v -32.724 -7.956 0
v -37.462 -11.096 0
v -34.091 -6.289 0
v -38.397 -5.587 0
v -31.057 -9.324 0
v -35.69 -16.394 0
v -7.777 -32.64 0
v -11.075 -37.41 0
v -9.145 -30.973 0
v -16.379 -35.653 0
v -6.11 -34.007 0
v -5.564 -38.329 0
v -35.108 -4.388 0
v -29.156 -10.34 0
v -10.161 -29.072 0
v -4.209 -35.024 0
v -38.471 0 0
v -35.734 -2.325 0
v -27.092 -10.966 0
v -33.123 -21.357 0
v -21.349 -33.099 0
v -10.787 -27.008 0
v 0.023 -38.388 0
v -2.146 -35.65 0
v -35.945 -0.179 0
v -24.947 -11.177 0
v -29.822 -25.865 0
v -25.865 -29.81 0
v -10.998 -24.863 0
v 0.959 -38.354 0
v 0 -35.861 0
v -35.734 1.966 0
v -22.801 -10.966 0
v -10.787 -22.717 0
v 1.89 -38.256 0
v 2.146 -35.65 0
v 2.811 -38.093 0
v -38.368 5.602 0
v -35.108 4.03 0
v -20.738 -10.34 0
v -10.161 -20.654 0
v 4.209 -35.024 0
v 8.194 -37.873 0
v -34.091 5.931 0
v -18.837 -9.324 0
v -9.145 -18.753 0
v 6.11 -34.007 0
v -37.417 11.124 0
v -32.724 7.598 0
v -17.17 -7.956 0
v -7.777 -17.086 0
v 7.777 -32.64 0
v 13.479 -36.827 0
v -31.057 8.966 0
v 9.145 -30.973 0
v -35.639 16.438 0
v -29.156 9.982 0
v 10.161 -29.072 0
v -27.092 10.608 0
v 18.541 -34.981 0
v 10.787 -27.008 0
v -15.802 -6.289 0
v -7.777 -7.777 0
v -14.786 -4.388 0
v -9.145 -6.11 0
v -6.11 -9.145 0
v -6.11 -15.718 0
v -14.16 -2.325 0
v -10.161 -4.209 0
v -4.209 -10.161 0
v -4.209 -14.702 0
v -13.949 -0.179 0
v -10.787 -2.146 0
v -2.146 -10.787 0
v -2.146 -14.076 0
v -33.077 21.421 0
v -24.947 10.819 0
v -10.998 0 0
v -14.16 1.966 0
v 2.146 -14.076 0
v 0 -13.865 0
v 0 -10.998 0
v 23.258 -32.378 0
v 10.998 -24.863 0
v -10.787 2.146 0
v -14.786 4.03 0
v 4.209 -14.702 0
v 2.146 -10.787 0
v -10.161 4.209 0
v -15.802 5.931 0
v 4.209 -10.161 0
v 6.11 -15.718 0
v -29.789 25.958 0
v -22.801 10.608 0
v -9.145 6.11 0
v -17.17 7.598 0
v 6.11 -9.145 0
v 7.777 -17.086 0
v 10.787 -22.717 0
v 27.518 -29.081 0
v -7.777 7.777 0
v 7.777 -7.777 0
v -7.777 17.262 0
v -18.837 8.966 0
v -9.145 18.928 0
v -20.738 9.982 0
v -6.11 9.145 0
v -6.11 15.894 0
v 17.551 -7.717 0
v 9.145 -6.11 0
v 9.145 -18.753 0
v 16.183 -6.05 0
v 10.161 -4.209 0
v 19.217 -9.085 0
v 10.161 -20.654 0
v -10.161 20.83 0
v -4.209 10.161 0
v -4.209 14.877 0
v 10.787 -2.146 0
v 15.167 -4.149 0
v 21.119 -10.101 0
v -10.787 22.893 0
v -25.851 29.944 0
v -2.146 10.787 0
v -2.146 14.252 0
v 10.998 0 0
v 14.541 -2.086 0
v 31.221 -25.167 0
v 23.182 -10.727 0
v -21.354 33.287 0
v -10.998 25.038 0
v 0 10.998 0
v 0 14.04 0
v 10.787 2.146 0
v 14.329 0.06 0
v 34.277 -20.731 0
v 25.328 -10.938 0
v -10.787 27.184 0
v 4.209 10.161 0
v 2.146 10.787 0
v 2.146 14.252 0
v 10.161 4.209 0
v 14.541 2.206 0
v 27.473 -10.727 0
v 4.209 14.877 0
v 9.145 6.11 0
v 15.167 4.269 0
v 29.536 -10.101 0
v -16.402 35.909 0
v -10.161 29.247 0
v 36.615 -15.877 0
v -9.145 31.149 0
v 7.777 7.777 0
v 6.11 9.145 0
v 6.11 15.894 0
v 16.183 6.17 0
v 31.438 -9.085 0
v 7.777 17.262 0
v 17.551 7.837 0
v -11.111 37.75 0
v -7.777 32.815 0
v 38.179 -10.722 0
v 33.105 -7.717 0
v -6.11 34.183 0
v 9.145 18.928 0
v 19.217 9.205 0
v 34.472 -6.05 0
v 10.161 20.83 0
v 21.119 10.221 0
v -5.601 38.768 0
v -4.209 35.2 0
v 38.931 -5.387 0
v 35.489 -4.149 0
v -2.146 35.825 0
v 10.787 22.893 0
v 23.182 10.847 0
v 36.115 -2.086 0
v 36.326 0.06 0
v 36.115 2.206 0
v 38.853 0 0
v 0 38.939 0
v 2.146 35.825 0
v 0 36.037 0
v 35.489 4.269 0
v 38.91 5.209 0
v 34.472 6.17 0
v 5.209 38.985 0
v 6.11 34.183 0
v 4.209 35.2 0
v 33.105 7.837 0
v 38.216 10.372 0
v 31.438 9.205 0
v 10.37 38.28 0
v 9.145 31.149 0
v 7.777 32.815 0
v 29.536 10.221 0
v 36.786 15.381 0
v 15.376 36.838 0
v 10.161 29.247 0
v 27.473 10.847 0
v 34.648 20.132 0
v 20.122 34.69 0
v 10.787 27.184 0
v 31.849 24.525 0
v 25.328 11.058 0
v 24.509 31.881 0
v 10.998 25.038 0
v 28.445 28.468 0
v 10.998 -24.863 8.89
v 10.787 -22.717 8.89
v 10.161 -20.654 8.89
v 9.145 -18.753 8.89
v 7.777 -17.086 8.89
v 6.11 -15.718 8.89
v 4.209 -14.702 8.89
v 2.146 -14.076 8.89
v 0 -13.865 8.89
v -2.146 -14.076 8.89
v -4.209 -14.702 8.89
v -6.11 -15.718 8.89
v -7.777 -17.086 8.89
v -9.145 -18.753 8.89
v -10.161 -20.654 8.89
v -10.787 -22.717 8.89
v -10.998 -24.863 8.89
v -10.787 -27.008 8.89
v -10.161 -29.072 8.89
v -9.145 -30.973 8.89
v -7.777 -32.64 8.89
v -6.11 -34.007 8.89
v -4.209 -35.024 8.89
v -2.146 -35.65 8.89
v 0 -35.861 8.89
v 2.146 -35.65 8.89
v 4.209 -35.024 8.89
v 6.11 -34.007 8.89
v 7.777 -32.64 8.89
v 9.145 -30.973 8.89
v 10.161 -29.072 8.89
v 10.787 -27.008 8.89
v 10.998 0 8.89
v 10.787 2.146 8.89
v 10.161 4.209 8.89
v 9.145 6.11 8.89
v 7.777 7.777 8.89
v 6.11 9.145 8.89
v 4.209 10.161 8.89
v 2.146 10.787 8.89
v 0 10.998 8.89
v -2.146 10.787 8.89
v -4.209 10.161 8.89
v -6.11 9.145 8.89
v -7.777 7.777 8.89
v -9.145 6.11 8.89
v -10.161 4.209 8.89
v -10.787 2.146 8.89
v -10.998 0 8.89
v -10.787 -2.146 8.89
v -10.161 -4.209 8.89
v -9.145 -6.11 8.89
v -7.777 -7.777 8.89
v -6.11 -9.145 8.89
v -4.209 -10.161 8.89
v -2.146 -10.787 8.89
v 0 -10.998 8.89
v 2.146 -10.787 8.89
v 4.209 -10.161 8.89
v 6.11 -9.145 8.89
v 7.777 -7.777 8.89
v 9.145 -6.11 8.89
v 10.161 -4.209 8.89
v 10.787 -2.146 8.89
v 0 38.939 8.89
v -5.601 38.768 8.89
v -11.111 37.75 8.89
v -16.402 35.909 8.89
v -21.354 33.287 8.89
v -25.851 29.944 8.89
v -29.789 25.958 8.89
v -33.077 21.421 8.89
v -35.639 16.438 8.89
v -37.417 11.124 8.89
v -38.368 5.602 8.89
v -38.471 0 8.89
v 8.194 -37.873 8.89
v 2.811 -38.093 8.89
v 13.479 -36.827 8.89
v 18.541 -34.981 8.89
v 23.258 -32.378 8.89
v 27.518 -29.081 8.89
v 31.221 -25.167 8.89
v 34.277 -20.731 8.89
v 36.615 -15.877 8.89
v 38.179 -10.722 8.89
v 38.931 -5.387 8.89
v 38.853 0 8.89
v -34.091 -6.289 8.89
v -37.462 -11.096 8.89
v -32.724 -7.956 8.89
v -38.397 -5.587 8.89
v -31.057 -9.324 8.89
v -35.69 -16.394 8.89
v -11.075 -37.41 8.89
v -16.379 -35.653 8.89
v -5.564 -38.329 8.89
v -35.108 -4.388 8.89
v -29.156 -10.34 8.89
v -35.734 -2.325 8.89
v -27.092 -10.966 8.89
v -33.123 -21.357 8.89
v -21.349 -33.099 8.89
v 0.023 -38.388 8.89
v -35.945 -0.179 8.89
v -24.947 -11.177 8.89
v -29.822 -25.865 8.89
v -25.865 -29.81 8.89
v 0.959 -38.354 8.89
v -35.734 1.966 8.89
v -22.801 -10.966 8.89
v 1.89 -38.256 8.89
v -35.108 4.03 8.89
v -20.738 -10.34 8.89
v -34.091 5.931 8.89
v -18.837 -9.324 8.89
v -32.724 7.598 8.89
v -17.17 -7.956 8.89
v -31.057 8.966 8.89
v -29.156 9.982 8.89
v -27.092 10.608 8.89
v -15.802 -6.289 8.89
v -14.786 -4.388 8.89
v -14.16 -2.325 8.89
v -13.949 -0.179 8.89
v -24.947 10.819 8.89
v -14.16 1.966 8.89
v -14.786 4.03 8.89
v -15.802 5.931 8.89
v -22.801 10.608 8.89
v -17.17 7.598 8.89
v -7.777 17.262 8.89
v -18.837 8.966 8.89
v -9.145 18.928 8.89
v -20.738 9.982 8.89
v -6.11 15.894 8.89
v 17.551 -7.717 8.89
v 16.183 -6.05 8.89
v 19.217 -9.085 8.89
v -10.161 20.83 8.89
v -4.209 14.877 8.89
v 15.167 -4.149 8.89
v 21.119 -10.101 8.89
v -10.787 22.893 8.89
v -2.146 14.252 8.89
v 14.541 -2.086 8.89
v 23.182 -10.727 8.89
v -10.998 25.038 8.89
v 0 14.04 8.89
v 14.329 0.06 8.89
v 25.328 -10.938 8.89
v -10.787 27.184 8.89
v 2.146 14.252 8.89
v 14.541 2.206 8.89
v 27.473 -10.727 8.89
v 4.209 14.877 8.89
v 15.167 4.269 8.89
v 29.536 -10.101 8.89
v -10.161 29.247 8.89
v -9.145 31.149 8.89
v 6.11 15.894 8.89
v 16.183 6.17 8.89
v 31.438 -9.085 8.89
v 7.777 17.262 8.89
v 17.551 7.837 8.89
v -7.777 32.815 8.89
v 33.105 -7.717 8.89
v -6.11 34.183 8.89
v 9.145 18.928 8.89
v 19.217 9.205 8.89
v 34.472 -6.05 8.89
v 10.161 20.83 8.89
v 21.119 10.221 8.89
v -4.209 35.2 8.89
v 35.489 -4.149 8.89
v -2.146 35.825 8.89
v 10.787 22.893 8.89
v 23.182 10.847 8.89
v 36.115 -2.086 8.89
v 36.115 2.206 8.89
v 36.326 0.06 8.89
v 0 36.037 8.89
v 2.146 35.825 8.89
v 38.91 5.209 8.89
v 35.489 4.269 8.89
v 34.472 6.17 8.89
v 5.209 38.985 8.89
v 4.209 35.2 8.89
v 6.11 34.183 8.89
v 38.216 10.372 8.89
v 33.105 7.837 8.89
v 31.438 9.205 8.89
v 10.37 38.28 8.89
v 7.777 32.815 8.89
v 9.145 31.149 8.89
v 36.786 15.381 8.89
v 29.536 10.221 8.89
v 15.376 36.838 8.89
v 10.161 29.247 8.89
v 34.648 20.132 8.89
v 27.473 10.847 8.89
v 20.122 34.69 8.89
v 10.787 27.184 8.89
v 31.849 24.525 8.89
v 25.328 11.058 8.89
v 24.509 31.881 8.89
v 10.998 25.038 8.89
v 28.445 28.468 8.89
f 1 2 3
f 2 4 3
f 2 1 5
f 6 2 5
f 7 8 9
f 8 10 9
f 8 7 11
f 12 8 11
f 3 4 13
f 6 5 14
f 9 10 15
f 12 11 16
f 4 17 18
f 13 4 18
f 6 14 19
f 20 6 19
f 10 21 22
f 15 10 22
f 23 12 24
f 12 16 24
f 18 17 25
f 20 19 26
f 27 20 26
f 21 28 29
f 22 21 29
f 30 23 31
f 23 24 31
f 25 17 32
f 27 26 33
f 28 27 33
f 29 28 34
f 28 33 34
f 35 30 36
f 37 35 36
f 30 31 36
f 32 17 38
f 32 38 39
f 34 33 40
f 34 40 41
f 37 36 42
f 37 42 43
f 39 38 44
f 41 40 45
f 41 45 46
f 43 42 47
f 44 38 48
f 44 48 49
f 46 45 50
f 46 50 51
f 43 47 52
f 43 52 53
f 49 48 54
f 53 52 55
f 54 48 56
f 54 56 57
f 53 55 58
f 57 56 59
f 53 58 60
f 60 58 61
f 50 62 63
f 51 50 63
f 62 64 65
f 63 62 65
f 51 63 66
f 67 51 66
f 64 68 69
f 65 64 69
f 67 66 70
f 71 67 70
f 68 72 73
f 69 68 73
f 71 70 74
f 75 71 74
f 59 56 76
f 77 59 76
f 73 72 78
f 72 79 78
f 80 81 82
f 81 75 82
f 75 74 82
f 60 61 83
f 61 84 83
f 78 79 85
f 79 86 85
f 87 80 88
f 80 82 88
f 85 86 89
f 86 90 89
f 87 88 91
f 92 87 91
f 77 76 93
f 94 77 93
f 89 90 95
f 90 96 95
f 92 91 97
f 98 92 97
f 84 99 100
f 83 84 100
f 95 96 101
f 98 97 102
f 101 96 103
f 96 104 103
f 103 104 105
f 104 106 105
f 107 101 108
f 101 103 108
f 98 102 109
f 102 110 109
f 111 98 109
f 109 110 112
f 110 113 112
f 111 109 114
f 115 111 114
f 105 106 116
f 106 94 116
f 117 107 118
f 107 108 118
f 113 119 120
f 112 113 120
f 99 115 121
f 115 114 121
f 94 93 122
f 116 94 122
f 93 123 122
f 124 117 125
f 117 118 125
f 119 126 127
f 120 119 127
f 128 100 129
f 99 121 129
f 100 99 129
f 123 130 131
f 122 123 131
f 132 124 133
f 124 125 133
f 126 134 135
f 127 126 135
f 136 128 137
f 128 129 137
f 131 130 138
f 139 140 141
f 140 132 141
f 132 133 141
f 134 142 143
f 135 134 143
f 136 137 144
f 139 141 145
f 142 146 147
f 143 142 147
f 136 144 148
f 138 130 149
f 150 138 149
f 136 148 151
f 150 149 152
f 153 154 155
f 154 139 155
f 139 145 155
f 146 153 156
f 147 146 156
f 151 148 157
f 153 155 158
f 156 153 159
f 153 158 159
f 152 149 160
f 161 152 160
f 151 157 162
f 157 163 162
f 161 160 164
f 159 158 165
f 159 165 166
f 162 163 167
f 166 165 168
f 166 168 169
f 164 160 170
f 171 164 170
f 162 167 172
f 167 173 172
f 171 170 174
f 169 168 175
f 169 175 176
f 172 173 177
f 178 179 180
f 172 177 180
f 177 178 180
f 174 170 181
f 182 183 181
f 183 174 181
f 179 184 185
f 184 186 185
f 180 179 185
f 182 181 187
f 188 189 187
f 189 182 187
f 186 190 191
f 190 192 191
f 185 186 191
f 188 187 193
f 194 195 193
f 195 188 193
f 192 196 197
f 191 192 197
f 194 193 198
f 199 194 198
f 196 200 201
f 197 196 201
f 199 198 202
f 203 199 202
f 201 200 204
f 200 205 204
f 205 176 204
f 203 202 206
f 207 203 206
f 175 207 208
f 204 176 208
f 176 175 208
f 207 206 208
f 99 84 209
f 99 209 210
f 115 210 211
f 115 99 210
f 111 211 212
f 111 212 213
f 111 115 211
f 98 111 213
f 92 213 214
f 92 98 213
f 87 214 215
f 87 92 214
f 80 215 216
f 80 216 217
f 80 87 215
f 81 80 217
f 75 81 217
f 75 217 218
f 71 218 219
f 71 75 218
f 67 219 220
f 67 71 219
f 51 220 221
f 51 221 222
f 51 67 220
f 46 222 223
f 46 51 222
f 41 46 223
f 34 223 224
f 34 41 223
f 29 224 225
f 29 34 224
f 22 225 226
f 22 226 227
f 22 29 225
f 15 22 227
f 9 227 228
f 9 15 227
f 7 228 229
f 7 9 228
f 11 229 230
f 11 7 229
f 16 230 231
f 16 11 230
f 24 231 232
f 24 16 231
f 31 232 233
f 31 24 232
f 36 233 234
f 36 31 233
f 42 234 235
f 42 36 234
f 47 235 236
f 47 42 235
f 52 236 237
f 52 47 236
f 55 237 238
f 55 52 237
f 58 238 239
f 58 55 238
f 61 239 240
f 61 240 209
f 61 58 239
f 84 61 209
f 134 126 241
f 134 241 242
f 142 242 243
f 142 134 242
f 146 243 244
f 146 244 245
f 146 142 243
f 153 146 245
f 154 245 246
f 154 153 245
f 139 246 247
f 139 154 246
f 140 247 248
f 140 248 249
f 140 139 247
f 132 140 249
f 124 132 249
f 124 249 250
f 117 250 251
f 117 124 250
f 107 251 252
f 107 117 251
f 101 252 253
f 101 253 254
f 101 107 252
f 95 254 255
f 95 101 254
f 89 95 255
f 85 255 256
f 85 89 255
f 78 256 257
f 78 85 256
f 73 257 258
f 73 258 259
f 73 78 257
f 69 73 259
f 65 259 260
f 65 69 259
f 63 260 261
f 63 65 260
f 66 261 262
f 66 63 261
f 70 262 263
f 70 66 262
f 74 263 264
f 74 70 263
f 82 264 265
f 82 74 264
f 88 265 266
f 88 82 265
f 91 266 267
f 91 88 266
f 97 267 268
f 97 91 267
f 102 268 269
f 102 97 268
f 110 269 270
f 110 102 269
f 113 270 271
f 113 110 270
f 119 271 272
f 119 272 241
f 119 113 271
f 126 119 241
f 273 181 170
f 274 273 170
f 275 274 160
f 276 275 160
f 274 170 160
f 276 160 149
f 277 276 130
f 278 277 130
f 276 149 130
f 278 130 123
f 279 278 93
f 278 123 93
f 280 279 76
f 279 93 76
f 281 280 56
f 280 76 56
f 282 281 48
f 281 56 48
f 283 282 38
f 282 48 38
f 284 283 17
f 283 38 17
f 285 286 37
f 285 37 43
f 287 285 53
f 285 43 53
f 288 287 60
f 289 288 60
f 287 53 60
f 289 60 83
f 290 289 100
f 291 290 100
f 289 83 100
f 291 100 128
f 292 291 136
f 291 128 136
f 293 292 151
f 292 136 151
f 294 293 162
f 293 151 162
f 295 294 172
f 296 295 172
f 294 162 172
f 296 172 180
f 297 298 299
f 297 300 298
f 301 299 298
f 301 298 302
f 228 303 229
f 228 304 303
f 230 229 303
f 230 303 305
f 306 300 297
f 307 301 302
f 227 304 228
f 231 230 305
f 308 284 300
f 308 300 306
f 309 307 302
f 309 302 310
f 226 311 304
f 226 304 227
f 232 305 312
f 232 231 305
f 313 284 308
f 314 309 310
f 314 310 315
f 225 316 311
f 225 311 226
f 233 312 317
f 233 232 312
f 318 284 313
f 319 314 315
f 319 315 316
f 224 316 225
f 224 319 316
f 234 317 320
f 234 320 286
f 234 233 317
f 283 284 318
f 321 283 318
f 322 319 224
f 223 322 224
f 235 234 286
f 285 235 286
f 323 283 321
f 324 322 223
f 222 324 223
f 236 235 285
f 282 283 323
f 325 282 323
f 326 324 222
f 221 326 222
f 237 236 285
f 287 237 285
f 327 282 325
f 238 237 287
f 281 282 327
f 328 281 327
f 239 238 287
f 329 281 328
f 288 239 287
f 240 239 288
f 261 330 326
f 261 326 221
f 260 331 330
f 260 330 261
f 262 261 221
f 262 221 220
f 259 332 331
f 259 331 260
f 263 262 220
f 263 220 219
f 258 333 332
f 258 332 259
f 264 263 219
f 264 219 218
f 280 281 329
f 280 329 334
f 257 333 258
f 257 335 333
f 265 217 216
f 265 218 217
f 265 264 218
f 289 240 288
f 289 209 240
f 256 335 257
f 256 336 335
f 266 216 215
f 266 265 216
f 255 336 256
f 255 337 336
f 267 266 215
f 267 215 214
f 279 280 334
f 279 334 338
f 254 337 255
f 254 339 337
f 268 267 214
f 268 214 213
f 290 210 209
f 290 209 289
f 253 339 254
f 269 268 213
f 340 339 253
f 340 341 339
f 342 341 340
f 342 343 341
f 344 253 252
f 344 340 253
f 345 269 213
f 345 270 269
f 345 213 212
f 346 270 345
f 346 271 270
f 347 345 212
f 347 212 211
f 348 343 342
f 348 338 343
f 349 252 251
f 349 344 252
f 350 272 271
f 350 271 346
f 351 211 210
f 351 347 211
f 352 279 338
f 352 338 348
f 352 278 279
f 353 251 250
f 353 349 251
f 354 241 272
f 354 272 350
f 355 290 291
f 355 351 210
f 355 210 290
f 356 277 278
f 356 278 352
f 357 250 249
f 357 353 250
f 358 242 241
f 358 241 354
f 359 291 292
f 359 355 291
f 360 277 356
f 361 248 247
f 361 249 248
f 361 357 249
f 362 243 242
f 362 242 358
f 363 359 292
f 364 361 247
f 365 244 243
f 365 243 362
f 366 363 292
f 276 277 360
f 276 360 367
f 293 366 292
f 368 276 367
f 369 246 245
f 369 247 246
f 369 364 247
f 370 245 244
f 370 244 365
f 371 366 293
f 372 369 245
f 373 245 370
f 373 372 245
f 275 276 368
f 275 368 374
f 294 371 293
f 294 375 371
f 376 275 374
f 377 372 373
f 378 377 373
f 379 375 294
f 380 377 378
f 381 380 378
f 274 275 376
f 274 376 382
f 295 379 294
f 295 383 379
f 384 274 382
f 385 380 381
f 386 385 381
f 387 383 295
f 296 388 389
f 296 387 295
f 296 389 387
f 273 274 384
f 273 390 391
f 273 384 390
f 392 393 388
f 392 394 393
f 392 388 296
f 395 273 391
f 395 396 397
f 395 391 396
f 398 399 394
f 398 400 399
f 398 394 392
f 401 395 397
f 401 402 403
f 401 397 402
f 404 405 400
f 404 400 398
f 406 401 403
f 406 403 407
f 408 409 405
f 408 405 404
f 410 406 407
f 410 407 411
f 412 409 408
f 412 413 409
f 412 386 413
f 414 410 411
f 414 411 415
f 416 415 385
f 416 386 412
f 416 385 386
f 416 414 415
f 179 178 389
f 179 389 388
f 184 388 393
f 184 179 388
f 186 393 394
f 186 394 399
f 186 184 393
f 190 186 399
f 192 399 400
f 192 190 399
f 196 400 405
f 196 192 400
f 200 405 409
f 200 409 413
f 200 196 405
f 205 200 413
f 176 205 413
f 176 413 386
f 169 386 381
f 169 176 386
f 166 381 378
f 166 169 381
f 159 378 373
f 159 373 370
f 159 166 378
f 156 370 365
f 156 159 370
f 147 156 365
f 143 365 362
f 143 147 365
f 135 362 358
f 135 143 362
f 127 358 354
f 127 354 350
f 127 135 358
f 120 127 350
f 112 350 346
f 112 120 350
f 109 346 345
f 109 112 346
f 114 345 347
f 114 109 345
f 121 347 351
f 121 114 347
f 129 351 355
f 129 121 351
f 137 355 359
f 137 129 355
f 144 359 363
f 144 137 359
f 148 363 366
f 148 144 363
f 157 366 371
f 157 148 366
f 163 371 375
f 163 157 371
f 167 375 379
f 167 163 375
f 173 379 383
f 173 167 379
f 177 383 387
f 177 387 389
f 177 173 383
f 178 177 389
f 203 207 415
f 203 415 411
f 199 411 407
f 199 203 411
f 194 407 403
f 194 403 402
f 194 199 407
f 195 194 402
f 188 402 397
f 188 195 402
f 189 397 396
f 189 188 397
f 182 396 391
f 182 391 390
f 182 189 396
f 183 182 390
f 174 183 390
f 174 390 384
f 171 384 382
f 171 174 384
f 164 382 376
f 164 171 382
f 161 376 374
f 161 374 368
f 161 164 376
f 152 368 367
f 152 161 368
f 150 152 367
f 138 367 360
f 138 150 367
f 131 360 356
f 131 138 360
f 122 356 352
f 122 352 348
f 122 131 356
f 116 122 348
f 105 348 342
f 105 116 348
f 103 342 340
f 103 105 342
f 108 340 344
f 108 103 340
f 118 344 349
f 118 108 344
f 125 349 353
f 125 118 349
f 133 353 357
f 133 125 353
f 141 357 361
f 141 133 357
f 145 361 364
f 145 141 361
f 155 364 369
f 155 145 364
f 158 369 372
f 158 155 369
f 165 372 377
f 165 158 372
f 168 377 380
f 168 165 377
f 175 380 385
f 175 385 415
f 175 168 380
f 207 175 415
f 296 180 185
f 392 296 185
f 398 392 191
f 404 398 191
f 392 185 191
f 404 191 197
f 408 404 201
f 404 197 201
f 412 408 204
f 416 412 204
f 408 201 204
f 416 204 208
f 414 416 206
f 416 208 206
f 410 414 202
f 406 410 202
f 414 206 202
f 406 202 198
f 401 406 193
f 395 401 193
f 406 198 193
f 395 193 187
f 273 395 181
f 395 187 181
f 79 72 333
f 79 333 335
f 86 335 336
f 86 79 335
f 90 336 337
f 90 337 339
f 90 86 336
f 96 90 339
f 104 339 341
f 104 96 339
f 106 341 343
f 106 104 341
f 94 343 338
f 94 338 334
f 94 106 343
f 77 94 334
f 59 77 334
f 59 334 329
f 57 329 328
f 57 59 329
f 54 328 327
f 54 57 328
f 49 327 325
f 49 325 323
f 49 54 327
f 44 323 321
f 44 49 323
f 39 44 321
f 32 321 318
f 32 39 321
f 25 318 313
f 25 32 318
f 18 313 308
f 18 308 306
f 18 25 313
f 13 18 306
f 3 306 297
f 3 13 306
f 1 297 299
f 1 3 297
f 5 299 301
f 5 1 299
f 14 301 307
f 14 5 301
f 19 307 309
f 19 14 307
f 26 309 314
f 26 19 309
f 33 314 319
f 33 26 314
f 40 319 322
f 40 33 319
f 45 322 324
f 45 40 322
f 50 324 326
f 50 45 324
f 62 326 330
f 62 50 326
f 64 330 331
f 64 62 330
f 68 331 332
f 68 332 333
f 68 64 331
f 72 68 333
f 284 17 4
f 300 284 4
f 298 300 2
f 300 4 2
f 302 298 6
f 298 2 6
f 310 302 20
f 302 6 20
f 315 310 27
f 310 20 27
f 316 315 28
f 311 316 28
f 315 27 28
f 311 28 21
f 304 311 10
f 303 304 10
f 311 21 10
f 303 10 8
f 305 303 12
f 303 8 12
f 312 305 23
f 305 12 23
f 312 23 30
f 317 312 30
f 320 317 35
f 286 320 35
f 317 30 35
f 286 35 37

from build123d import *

# Parameters (mm, degrees)
F0_R     = 10.9982
F1_DEPTH = 8.89


with BuildPart() as f1:
    # F0 (on Top) → F1 (new body)
    with BuildSketch(Plane.XY):
        with BuildLine():
            ThreePointArc((38.8529947684, 0), (28.4453239469, 28.4684513244), (0, 38.9391665957))
            ThreePointArc((0, 38.9391665957), (-27.8957339054, 28.0256688183), (-38.4710963646, 0))
            ThreePointArc((-38.4710963646, 0), (-27.9199689316, -27.9141662733), (0.0231951649, -38.3882556901))
            ThreePointArc((0.0231951649, -38.3882556901), (-9.5721699853, -15.3070070583), (13.5255, -24.8627755791))
            ThreePointArc((13.5255, -24.8627755791), (10.5110469105, -33.3749458719), (2.8113610633, -38.0928700316))
            ThreePointArc((2.8113610633, -38.0928700316), (29.4450372623, -27.1955065208), (38.8529947684, 0))
        make_face()
        with BuildLine():
            ThreePointArc((-11.4212829144, -0.1791534288), (-25.0363615935, -13.7043567881), (-38.4710963646, 0))
            ThreePointArc((-38.4710963646, 0), (-24.8572042354, 13.3460499305), (-11.4212829144, -0.1791534288))
        make_face(mode=Mode.SUBTRACT)
        Circle(F0_R, mode=Mode.SUBTRACT)
        with BuildLine():
            ThreePointArc((38.8531280306, 0.0600404714), (38.853094715, 0.0300201617), (38.8529947684, 0))
            ThreePointArc((38.8529947684, 0), (11.8021613462, 0.090060781), (38.8531280306, 0.0600404714))
        make_face(mode=Mode.SUBTRACT)
        with BuildLine():
            ThreePointArc((0, 38.9391665957), (9.8292581555, 34.8677545596), (13.9006701916, 25.0384964041))
            ThreePointArc((13.9006701916, 25.0384964041), (-9.8292581555, 15.2092382486), (0, 38.9391665957))
        make_face(mode=Mode.SUBTRACT)
        with BuildLine():
            ThreePointArc((0, 38.9391665957), (-9.8292581555, 15.2092382486), (13.9006701916, 25.0384964041))
            ThreePointArc((13.9006701916, 25.0384964041), (9.8292581555, 34.8677545596), (0, 38.9391665957))
        make_face()
        with Locations((0, 25.0384964041)):
            Circle(F0_R, mode=Mode.SUBTRACT)
        with BuildLine():
            ThreePointArc((-11.4212829144, -0.1791534288), (-24.8572042354, 13.3460499305), (-38.4710963646, 0))
            ThreePointArc((-38.4710963646, 0), (-25.0363615935, -13.7043567881), (-11.4212829144, -0.1791534288))
        make_face()
        with Locations((-24.9467829144, -0.1791534288)):
            Circle(F0_R, mode=Mode.SUBTRACT)
        with BuildLine():
            ThreePointArc((38.8531280306, 0.0600404714), (11.8021613462, 0.090060781), (38.8529947684, 0))
            ThreePointArc((38.8529947684, 0), (38.853094715, 0.0300201617), (38.8531280306, 0.0600404714))
        make_face()
        with Locations((25.3276280306, 0.0600404714)):
            Circle(F0_R, mode=Mode.SUBTRACT)
        with BuildLine():
            ThreePointArc((0.0231951649, -38.3882556901), (1.4201424448, -38.2675994791), (2.8113610633, -38.0928700316))
            ThreePointArc((2.8113610633, -38.0928700316), (10.5110469105, -33.3749458719), (13.5255, -24.8627755791))
            ThreePointArc((13.5255, -24.8627755791), (-9.5721699853, -15.3070070583), (0.0231951649, -38.3882556901))
        make_face()
        with Locations((0, -24.8627755791)):
            Circle(F0_R, mode=Mode.SUBTRACT)
        with BuildLine():
            ThreePointArc((0.0231951649, -38.3882556901), (1.4249527798, -38.3130045669), (2.8113610633, -38.0928700316))
            ThreePointArc((2.8113610633, -38.0928700316), (1.4201424448, -38.2675994791), (0.0231951649, -38.3882556901))
        make_face()
    extrude(amount=F1_DEPTH)


solid = f1.part
